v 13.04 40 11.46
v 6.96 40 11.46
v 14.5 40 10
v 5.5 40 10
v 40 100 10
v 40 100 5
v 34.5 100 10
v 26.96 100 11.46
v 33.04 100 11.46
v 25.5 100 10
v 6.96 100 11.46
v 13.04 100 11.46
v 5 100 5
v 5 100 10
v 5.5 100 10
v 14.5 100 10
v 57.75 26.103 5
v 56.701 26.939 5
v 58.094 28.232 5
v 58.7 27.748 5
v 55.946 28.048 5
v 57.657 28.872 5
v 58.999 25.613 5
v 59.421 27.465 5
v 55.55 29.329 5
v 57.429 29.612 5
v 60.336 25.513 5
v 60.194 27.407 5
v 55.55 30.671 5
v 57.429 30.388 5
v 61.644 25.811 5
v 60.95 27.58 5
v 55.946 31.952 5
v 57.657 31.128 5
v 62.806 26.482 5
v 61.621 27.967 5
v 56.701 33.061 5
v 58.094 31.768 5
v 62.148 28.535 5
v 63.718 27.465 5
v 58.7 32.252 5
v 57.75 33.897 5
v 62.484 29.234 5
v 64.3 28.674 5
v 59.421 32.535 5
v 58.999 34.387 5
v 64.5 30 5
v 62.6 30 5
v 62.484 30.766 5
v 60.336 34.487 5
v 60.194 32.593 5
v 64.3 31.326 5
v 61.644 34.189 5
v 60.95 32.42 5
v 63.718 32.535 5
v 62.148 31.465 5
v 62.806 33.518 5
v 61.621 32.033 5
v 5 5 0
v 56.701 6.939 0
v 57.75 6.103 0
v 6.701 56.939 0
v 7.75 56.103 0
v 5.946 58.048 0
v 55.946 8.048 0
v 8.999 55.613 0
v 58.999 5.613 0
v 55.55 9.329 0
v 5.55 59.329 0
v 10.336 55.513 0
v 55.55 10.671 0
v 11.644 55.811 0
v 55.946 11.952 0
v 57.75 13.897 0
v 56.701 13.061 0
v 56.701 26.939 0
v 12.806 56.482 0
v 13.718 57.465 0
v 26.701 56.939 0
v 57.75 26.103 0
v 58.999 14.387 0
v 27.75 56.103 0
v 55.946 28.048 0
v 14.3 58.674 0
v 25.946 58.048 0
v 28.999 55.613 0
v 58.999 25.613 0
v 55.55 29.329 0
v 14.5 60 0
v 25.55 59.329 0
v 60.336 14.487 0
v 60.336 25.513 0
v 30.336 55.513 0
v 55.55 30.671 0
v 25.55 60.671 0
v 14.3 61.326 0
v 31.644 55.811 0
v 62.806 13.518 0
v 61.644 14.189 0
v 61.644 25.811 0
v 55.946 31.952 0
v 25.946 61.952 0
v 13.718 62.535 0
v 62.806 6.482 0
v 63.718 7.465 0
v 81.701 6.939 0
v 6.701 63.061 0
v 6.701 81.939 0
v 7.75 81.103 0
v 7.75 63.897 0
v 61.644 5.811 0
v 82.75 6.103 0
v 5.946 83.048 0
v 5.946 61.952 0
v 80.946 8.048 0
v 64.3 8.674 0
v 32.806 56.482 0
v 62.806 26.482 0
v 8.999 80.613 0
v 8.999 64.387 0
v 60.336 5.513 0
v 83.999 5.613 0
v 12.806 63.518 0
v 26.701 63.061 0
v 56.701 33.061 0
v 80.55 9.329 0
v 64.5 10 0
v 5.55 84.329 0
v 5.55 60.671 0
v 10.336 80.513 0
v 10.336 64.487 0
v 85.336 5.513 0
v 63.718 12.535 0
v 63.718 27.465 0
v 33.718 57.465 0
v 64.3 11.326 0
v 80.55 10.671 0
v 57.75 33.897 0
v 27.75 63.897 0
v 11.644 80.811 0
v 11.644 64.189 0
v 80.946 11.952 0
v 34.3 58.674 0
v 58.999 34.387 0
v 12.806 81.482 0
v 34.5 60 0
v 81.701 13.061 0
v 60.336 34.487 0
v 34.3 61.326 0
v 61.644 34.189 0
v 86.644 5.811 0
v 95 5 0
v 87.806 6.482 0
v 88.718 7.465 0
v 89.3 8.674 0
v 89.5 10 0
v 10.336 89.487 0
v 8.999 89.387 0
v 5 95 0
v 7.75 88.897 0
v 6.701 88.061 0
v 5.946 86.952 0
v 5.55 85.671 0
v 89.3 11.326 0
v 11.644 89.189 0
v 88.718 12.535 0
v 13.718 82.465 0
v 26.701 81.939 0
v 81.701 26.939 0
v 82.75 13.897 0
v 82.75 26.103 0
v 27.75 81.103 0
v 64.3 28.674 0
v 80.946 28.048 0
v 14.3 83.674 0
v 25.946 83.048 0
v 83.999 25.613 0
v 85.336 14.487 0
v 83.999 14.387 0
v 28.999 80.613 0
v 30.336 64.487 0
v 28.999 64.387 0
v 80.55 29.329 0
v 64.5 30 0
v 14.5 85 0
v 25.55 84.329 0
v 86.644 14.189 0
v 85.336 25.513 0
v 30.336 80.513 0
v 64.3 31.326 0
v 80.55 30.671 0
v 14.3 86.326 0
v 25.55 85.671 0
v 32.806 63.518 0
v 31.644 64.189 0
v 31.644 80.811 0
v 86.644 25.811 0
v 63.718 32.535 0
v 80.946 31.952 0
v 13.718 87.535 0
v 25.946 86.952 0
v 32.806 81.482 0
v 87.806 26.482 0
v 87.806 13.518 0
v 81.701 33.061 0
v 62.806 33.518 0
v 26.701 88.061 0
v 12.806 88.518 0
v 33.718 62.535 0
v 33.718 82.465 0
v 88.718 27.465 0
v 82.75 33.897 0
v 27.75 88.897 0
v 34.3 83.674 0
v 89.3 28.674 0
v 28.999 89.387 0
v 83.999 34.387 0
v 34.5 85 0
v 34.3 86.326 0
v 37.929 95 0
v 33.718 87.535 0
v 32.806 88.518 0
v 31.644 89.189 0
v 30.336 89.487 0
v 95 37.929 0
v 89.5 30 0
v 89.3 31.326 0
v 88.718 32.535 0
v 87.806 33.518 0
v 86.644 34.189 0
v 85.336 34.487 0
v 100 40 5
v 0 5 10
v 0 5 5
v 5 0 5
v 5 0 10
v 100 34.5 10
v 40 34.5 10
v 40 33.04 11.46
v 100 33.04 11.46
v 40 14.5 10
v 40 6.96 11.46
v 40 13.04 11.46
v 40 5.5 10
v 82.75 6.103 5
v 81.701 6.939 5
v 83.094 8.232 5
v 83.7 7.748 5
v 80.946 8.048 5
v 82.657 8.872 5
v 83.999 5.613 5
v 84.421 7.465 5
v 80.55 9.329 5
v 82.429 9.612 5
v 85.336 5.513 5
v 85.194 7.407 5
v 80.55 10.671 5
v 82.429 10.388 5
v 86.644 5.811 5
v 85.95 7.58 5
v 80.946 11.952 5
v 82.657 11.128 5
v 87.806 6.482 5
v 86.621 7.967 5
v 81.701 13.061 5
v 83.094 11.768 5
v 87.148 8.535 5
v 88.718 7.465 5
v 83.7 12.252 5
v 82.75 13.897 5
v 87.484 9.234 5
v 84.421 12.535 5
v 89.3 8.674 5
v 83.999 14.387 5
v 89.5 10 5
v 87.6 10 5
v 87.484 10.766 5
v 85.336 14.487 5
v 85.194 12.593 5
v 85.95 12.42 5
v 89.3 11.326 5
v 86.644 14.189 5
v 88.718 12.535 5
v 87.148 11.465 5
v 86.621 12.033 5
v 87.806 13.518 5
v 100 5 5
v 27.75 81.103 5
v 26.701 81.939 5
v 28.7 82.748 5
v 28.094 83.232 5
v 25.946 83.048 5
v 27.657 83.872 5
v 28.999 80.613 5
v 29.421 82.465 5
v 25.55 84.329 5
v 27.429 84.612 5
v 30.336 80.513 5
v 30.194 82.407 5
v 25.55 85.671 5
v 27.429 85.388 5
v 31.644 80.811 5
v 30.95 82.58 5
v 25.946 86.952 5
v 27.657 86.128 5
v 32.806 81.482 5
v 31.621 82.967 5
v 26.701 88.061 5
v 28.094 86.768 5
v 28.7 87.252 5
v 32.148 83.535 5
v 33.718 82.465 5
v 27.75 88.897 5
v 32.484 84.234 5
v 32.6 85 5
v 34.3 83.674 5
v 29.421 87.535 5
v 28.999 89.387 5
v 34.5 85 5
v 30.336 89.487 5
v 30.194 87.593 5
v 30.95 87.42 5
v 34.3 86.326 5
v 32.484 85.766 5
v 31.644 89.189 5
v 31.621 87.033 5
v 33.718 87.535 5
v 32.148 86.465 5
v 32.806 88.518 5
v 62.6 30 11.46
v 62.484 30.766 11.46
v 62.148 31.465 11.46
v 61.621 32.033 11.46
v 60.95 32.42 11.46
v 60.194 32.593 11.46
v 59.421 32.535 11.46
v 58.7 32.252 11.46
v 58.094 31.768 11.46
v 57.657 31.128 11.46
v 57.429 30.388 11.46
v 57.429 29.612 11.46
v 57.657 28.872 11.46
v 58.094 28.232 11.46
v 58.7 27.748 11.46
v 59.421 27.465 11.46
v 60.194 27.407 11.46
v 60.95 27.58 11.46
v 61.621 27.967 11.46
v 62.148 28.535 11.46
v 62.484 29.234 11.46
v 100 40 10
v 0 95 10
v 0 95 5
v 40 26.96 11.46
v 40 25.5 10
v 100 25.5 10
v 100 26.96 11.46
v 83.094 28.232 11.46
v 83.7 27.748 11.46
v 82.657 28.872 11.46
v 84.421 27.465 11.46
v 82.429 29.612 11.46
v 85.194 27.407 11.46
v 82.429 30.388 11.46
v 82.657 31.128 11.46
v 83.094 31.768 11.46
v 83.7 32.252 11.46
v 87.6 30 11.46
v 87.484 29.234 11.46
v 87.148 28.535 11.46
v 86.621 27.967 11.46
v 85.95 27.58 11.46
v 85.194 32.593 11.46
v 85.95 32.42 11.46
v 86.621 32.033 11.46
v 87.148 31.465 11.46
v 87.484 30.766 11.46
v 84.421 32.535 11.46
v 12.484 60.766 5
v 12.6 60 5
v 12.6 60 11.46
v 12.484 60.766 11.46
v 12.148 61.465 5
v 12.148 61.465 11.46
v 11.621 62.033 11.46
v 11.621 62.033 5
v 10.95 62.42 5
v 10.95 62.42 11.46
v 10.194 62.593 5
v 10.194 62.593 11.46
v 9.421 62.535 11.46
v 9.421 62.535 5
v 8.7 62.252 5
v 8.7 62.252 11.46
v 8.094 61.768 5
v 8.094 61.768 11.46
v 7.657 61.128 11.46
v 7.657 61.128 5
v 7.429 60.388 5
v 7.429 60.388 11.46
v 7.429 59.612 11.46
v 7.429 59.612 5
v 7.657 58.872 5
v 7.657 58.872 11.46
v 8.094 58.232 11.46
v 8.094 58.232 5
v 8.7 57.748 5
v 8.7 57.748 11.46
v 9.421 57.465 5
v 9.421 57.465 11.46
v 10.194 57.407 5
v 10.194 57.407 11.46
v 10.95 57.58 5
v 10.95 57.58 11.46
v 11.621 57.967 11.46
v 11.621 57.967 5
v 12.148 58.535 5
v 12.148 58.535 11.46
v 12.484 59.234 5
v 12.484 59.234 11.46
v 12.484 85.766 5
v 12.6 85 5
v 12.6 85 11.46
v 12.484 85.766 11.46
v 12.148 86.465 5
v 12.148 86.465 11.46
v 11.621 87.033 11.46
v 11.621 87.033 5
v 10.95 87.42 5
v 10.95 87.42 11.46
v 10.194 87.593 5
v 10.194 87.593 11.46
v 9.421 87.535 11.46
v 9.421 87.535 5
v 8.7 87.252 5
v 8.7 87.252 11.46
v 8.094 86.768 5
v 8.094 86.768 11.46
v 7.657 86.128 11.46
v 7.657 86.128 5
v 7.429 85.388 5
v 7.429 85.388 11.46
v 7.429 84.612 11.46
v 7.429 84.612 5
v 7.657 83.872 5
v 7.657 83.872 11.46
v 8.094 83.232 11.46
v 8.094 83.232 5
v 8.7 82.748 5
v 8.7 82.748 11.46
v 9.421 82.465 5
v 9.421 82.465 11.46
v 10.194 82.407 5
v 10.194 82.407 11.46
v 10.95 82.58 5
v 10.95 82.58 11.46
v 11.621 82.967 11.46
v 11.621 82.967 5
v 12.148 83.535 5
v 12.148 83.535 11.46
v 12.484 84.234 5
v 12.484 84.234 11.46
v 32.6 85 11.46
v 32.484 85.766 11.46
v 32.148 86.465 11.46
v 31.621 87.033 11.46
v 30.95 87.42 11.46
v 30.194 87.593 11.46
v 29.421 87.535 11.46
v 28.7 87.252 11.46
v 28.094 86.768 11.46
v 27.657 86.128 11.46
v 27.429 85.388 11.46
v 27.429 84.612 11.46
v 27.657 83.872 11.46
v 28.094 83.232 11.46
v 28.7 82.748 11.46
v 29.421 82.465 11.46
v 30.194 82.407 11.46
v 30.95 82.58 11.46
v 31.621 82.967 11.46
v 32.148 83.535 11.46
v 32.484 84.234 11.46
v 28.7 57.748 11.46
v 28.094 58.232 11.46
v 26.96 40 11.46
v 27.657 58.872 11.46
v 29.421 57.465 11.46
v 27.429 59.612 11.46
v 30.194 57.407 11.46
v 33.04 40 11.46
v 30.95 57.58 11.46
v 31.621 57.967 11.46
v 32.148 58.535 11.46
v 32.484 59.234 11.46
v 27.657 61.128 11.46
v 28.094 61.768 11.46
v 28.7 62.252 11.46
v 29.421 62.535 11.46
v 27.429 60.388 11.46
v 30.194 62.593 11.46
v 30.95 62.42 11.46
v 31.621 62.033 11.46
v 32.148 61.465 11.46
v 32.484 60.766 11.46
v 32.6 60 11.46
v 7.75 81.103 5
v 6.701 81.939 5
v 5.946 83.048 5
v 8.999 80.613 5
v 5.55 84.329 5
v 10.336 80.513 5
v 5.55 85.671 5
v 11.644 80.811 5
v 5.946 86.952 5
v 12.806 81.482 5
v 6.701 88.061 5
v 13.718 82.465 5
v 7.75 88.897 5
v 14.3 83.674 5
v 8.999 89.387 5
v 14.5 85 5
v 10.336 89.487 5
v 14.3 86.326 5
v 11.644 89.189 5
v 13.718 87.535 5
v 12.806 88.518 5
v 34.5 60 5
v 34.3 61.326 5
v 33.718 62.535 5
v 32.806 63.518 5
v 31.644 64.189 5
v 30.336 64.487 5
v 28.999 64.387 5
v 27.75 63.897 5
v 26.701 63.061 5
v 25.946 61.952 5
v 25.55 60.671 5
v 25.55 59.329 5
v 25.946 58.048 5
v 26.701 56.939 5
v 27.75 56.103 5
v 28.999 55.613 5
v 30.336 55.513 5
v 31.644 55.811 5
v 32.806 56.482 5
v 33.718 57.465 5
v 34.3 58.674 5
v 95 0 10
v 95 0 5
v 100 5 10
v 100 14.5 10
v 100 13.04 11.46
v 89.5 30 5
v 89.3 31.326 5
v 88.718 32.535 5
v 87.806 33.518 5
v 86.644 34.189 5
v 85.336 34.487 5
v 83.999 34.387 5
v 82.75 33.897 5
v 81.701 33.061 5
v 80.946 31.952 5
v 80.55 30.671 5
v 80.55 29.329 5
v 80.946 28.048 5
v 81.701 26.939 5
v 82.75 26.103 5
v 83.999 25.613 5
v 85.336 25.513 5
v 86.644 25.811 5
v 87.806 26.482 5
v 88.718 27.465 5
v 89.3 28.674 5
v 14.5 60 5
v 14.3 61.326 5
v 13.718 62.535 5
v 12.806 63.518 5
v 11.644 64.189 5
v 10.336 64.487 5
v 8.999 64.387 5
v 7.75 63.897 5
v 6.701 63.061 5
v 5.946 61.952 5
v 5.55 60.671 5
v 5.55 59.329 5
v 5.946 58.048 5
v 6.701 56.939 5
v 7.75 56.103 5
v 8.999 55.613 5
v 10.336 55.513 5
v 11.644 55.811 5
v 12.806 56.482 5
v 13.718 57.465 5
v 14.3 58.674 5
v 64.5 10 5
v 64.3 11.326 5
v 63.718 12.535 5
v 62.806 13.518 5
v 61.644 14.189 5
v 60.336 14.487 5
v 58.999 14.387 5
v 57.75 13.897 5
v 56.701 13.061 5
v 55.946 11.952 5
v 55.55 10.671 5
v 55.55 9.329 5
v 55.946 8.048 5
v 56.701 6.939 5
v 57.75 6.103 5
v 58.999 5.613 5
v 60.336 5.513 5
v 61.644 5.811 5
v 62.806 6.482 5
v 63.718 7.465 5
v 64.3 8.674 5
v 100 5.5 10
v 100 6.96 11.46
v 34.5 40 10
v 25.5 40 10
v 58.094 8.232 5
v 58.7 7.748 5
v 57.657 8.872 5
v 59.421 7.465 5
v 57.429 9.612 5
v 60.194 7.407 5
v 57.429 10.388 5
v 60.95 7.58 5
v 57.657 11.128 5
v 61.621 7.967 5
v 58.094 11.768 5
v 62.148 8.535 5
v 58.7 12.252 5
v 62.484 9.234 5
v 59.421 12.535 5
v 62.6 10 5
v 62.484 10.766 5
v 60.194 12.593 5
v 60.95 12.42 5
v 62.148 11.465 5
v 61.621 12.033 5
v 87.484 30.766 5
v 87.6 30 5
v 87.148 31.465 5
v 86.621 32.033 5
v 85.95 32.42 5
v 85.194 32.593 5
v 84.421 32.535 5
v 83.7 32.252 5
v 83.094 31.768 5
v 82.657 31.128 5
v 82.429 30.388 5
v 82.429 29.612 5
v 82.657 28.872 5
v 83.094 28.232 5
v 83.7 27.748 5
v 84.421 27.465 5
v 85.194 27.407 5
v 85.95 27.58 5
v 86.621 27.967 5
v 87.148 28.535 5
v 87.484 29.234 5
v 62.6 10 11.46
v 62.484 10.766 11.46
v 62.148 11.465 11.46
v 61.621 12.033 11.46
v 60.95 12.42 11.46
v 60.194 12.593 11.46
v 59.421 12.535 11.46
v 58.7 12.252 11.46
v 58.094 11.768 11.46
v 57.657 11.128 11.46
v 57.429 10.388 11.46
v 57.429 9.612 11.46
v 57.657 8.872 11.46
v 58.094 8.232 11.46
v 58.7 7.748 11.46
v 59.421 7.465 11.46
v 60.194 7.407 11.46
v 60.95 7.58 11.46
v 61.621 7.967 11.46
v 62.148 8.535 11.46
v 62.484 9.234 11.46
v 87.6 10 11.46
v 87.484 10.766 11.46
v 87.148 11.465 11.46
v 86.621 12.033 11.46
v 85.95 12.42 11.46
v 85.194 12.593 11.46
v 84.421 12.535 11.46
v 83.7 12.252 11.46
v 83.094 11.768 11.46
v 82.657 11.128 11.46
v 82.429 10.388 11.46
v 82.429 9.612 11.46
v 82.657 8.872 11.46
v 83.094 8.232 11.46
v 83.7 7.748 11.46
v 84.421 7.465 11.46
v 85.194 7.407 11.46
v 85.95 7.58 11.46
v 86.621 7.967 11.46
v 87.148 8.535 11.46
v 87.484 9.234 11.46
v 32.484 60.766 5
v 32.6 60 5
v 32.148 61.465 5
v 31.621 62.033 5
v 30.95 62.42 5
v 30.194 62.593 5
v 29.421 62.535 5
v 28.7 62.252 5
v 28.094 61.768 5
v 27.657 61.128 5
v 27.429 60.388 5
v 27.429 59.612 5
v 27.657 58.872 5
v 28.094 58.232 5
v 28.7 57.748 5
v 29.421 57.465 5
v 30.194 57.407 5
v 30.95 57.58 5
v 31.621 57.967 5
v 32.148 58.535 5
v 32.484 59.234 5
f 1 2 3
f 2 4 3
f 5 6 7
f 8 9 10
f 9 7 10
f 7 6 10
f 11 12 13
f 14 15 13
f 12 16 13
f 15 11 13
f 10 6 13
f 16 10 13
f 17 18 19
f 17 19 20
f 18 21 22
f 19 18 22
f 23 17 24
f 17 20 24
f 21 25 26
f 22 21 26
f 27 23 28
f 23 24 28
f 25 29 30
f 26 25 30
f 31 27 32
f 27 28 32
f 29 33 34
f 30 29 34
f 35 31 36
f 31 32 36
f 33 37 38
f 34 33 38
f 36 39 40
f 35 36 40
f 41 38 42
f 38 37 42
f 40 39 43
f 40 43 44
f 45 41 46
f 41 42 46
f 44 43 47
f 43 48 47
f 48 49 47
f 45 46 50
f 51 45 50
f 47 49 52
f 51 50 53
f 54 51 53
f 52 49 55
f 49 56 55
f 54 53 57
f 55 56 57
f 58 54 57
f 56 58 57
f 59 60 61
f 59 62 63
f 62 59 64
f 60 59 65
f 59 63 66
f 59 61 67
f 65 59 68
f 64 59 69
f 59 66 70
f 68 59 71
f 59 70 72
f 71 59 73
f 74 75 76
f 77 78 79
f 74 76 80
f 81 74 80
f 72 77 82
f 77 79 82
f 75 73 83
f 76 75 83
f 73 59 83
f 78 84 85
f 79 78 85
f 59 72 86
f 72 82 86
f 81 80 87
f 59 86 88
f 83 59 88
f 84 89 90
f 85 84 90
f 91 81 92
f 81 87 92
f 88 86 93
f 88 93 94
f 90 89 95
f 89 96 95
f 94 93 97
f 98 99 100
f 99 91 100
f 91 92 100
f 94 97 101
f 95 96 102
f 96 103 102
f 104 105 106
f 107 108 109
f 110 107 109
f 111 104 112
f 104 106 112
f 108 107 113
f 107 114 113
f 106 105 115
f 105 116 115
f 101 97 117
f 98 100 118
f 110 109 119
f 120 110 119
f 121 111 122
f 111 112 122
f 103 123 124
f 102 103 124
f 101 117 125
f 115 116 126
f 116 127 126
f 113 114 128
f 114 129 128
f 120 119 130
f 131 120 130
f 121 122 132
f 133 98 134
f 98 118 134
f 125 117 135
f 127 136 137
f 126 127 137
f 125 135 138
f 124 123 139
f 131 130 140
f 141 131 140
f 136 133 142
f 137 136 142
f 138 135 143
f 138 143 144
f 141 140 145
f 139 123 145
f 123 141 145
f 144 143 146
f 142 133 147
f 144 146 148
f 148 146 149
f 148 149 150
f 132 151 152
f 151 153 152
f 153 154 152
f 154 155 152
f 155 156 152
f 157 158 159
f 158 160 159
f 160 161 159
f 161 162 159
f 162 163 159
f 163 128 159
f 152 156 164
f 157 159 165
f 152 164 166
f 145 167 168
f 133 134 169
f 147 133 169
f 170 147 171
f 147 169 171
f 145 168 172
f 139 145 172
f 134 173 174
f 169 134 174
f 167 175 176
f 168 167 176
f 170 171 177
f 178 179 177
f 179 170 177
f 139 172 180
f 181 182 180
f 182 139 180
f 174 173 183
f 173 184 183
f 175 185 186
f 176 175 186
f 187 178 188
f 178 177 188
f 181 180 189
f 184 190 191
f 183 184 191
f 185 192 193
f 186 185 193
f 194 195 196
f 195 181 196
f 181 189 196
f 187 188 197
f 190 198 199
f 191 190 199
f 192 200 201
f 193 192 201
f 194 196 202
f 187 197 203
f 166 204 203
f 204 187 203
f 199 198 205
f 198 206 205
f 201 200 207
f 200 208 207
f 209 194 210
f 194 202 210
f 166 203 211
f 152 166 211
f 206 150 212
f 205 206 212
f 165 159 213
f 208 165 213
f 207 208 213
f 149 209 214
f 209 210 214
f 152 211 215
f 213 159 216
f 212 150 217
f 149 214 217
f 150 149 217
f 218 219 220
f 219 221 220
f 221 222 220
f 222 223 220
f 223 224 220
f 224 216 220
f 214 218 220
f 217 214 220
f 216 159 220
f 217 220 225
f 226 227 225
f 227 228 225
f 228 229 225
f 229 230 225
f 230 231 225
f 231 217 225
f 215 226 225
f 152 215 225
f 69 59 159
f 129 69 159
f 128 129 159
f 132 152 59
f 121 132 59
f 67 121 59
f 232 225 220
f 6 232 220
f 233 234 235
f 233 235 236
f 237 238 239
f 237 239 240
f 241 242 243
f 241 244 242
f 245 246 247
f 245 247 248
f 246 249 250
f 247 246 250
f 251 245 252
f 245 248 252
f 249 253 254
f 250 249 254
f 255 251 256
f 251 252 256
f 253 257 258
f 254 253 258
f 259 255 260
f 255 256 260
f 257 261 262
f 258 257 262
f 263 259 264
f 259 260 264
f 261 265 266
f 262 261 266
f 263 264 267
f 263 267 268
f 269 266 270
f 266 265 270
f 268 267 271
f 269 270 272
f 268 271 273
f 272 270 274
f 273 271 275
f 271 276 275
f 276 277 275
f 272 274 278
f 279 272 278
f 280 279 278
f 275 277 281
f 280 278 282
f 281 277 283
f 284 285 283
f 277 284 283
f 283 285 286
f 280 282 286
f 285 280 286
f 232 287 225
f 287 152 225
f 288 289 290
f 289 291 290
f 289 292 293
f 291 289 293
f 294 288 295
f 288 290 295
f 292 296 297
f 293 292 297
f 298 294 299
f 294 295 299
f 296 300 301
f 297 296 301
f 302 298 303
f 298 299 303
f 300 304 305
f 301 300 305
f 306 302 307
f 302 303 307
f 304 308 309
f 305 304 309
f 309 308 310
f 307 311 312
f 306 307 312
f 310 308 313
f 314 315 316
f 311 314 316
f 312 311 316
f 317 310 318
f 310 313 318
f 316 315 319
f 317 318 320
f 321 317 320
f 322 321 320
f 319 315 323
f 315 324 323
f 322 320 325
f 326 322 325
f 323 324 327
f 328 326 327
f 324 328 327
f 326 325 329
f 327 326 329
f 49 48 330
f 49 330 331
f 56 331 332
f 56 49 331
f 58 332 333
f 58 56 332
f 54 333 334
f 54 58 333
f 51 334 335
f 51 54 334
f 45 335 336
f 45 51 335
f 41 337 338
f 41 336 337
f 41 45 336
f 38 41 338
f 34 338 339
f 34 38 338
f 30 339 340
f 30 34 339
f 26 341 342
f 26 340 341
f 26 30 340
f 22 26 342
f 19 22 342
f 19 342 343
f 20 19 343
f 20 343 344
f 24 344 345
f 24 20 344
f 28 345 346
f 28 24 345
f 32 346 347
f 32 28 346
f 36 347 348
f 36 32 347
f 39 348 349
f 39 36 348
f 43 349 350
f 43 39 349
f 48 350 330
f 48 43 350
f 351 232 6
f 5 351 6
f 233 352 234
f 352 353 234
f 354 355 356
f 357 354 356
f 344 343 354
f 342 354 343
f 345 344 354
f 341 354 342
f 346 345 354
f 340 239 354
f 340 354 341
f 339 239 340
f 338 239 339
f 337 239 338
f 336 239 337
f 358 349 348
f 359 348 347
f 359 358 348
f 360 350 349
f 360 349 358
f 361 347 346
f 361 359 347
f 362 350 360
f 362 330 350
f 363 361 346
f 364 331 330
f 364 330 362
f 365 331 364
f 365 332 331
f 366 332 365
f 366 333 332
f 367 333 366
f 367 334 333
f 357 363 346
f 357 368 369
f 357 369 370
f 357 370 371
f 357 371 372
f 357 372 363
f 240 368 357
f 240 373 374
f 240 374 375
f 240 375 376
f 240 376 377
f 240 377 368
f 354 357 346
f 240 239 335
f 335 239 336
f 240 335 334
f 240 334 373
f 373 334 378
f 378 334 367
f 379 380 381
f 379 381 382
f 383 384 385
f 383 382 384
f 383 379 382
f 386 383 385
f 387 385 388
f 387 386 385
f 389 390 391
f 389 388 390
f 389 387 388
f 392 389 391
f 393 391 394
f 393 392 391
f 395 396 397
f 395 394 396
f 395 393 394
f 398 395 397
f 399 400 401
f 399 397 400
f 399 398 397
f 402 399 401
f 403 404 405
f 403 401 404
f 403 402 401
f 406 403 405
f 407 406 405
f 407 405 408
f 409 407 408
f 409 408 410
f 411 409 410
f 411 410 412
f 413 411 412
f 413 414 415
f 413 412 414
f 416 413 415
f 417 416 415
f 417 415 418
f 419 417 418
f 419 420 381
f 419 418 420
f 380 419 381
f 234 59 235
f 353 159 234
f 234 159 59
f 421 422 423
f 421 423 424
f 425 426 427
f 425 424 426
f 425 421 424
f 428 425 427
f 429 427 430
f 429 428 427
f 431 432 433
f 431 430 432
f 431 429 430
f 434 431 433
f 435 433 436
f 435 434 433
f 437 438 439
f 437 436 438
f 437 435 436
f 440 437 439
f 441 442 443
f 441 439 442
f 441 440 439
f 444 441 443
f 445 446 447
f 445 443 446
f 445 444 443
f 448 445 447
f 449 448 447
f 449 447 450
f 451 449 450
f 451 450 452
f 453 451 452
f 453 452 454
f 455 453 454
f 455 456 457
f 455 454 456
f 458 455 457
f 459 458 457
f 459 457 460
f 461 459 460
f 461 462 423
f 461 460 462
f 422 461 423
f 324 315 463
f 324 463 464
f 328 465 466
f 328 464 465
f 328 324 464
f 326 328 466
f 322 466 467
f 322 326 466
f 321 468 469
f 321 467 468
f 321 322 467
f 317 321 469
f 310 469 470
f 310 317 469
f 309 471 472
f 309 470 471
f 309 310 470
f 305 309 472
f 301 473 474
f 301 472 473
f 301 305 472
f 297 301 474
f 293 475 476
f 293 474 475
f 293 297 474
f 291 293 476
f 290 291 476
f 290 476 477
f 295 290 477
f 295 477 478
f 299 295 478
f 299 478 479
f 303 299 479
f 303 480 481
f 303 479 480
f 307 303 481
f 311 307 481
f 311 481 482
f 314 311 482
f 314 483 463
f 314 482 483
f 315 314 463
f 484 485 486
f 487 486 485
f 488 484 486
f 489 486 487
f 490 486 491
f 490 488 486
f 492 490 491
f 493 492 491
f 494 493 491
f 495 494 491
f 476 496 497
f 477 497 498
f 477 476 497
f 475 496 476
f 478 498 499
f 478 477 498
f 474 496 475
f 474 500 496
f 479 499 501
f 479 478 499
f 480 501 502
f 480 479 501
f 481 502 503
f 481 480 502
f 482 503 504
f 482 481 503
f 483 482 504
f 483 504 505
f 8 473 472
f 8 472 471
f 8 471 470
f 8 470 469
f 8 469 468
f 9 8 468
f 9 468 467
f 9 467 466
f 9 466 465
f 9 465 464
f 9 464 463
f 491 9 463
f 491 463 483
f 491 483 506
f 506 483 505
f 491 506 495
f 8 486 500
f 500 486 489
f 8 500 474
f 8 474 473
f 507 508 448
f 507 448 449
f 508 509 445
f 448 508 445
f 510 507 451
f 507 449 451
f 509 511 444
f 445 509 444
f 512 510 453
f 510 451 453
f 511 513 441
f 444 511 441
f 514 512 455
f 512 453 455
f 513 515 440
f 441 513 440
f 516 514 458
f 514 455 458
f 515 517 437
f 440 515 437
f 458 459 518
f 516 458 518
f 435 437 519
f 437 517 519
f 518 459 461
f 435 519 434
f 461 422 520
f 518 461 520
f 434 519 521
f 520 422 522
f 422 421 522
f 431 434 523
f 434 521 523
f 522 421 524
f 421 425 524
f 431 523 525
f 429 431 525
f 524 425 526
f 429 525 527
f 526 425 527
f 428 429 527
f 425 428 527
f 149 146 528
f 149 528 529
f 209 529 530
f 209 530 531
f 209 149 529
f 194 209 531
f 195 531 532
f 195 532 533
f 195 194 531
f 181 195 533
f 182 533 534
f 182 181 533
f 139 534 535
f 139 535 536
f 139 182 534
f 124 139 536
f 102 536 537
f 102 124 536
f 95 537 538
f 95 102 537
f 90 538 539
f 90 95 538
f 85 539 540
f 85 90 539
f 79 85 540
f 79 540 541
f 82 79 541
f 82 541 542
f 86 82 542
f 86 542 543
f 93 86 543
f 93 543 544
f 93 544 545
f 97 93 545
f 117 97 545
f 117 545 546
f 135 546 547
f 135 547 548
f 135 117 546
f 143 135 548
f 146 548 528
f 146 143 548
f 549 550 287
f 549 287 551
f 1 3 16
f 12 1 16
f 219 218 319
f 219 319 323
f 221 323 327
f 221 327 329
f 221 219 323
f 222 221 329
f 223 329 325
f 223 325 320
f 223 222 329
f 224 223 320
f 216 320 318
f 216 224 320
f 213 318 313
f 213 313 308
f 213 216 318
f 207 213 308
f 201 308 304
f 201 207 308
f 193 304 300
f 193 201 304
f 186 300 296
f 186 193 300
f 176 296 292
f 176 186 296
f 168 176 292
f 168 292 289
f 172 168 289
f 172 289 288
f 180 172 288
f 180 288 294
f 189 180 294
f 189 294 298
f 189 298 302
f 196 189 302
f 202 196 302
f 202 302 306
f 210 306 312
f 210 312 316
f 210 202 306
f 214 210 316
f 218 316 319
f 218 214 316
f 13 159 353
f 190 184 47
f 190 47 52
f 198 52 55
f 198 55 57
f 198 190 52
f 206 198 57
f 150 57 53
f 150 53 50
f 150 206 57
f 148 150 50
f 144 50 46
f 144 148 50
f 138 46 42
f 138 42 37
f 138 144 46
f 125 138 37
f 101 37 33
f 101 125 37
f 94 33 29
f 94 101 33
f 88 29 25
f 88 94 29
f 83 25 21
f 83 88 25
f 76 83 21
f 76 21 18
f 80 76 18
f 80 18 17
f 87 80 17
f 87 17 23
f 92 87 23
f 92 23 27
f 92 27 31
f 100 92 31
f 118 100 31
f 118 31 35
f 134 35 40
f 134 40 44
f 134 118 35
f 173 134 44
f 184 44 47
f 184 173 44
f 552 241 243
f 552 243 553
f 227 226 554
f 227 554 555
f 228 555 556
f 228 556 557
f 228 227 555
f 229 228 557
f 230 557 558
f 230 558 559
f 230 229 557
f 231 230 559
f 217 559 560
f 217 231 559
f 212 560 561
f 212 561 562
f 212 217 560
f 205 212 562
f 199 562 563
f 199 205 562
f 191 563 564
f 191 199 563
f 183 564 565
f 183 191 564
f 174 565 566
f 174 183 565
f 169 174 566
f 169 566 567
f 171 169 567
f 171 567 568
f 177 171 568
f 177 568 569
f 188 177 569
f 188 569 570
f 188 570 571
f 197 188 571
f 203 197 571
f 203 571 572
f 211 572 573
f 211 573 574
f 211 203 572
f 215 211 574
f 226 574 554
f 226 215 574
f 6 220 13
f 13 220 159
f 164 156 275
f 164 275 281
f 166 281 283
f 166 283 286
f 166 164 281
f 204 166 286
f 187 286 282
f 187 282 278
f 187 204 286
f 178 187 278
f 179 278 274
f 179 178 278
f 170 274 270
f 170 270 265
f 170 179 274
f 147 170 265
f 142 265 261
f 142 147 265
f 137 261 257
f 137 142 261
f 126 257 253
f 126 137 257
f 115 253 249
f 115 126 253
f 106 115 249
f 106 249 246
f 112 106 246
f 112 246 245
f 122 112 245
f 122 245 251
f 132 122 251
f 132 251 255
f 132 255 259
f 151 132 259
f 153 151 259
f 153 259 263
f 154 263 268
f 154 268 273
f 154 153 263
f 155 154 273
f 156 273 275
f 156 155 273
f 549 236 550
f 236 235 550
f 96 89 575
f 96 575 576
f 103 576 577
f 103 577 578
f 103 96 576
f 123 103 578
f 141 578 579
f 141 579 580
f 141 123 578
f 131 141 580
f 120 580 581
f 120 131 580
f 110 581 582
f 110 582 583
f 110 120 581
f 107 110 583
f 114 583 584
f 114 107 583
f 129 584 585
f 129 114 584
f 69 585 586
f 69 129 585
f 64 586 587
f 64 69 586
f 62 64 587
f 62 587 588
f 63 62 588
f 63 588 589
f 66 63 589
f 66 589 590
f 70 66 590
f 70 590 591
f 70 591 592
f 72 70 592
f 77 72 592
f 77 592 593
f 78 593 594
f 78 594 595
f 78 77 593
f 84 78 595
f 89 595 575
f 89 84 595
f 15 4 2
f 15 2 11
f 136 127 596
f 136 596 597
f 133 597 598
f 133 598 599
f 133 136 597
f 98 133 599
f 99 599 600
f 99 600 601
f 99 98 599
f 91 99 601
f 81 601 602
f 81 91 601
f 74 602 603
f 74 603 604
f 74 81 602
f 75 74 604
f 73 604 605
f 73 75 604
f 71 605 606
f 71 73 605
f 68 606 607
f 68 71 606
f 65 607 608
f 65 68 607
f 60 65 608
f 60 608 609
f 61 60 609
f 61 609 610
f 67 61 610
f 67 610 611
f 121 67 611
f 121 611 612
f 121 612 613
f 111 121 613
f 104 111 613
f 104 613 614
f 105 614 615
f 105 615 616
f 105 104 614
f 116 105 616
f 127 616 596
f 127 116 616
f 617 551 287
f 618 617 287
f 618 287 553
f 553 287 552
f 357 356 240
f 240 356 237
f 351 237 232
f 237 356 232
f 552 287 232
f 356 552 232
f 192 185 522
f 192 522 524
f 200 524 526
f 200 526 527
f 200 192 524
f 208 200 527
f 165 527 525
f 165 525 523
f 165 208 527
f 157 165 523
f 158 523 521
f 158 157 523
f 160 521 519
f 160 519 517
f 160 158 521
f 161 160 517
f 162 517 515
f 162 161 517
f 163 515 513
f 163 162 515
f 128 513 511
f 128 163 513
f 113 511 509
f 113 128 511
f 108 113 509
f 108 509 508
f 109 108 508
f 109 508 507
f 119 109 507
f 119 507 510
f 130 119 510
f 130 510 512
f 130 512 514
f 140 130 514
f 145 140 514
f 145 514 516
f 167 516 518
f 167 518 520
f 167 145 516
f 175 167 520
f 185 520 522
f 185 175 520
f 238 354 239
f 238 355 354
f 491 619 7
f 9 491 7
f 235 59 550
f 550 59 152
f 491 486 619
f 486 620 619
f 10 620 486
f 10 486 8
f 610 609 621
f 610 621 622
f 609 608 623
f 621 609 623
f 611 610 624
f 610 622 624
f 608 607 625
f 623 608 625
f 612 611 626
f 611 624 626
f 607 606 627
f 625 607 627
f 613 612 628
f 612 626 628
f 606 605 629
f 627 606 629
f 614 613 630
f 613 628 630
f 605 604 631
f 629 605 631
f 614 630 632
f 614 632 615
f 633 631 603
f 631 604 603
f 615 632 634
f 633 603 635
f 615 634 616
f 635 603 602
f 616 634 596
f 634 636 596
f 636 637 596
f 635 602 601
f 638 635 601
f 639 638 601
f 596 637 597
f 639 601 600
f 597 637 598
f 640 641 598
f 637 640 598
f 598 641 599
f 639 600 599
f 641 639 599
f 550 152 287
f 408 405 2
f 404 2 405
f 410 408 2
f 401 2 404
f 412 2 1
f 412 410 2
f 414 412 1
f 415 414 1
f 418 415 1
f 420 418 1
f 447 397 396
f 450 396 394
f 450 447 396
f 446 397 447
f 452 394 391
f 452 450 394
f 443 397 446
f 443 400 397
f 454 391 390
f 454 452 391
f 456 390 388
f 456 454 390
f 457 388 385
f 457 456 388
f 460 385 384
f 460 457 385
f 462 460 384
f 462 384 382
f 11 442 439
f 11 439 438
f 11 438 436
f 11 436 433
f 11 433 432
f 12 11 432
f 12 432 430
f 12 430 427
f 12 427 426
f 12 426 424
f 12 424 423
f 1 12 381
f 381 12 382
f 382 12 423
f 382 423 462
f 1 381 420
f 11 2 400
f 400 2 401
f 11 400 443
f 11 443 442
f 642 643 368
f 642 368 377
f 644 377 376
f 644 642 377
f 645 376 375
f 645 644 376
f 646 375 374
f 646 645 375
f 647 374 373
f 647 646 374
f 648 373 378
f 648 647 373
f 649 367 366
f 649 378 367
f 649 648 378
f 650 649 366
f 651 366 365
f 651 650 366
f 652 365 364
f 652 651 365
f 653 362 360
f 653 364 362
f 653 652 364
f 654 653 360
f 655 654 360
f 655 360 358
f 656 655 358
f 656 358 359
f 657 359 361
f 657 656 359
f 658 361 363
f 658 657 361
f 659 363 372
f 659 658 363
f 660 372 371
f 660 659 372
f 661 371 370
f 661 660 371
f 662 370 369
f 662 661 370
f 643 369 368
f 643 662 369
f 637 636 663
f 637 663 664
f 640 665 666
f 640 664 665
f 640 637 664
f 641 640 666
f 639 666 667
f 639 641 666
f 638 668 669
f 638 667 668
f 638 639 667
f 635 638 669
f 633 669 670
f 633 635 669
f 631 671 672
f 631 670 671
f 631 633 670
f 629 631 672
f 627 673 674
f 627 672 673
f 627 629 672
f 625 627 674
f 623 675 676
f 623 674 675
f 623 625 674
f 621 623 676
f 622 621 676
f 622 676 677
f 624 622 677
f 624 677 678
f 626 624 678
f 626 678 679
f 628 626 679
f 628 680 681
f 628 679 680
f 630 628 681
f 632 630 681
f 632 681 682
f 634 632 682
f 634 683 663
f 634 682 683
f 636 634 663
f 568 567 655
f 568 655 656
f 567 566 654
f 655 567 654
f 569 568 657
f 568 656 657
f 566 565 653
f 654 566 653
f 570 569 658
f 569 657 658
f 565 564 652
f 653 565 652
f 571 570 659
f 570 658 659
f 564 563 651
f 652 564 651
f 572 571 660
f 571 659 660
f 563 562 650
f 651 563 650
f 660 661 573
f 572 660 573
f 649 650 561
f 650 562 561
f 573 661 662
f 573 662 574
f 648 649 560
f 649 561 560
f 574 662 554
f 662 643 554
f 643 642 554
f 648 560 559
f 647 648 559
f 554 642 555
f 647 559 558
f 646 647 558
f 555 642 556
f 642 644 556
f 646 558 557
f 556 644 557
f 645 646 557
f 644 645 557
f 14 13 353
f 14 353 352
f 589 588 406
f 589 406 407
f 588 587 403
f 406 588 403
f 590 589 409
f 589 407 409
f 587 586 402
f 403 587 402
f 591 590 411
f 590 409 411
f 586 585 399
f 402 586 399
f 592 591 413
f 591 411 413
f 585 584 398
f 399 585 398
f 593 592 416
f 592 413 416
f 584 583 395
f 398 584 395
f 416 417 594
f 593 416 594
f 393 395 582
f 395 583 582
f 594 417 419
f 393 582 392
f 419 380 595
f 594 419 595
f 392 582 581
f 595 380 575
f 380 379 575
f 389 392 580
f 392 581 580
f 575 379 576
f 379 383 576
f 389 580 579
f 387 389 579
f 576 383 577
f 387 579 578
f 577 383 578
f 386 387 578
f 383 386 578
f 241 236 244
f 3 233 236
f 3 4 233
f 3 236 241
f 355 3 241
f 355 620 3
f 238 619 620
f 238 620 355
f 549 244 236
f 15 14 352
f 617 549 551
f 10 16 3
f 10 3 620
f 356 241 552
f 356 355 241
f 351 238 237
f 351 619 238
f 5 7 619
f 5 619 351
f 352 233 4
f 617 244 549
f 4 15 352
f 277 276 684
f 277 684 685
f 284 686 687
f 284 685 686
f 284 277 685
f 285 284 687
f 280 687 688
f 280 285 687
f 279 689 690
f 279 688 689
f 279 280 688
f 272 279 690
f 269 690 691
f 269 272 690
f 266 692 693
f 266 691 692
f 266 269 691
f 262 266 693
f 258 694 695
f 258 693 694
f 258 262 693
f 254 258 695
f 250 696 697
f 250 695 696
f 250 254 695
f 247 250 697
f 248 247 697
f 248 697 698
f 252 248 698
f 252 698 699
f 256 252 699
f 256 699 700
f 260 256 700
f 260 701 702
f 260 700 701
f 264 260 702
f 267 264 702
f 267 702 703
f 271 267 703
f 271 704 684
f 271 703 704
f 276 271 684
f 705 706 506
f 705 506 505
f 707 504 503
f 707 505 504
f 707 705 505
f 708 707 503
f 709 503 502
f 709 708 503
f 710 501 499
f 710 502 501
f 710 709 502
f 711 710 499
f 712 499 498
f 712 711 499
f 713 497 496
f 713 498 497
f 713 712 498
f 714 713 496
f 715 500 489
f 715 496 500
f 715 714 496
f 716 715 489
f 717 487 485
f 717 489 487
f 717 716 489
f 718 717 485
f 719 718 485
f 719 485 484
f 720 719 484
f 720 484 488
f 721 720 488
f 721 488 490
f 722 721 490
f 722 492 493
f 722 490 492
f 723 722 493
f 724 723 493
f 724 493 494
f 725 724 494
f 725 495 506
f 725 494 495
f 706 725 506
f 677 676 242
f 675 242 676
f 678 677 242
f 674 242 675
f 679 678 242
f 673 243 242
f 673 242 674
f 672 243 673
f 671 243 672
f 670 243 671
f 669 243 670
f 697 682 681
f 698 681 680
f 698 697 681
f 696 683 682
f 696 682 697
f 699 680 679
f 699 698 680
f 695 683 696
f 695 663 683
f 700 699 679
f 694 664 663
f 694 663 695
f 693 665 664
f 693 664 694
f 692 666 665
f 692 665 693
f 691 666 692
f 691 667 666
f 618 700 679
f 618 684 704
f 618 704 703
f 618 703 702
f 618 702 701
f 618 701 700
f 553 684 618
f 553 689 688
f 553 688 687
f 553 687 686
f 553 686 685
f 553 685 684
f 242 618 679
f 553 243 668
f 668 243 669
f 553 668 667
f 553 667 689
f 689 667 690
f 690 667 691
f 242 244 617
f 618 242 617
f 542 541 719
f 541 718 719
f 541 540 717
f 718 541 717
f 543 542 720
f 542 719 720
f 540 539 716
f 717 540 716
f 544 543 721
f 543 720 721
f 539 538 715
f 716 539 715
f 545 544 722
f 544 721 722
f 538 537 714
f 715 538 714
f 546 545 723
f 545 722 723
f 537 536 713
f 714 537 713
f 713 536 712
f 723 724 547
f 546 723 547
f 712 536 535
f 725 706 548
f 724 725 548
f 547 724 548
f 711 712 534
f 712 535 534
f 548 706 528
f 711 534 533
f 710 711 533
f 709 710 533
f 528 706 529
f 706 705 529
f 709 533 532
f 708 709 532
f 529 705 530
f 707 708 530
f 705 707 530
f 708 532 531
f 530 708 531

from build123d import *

# Parameters (mm, degrees)
BOSS_EXTRUDE1_DEPTH     = 10
SKETCH2_R               = 2.6
CUT_EXTRUDE1_DEPTH      = 142.774468788
BOSS_EXTRUDE3_START     = 10
SKETCH3_W               = 60
SKETCH3_H               = 9
SKETCH3_W_2             = 9
SKETCH3_H_2             = 60
BOSS_EXTRUDE3_DEPTH     = 1.46
CUT_EXTRUDE2_DEPTH      = 142.884923794
CUT_EXTRUDE2_DEPTH_BACK = 142.884923794
SKETCH2_2_R             = 2.6
CHAMFER1_SIZE           = 1.46
SKETCH4_R               = 4.5
CUT_EXTRUDE3_DEPTH      = 5
CHAMFER2_SIZE           = 5


with BuildPart() as part:
    # Sketch1 → Boss-Extrude1 (new body)
    with BuildSketch(Plane.XY):
        Polygon((0, 0), (100, 0), (100, 40), (40, 100), (0, 100), align=None)
    extrude(amount=BOSS_EXTRUDE1_DEPTH)

    # Sketch2 → Cut-Extrude1 (cut, through all)
    with BuildSketch(Plane.XY):
        with Locations((10, 85)):
            Circle(SKETCH2_R)
        with Locations((30, 85)):
            Circle(SKETCH2_R)
        with Locations((10, 60)):
            Circle(SKETCH2_R)
        with Locations((30, 60)):
            Circle(SKETCH2_R)
        with Locations((85, 30)):
            Circle(SKETCH2_R)
        with Locations((85, 10)):
            Circle(SKETCH2_R)
        with Locations((60, 10)):
            Circle(SKETCH2_R)
        with Locations((60, 30)):
            Circle(SKETCH2_R)
    extrude(amount=CUT_EXTRUDE1_DEPTH, mode=Mode.SUBTRACT)

    # Sketch3 → Boss-Extrude3 (add)
    with BuildSketch(Plane.XY.offset(BOSS_EXTRUDE3_START)):
        with Locations((70, 30)):
            Rectangle(SKETCH3_W, SKETCH3_H)
        with Locations((70, 10)):
            Rectangle(SKETCH3_W, SKETCH3_H)
        with Locations((10, 70)):
            Rectangle(SKETCH3_W_2, SKETCH3_H_2)
        with Locations((30, 70)):
            Rectangle(SKETCH3_W_2, SKETCH3_H_2)
    extrude(amount=BOSS_EXTRUDE3_DEPTH)

    # Sketch2<2> → Cut-Extrude2 (cut, two sides: drawn at the far end of the back side and taken through both)
    with BuildSketch(Plane.XY.offset(-CUT_EXTRUDE2_DEPTH_BACK)):
        with Locations((10, 85)):
            Circle(SKETCH2_2_R)
        with Locations((30, 85)):
            Circle(SKETCH2_2_R)
        with Locations((10, 60)):
            Circle(SKETCH2_2_R)
        with Locations((30, 60)):
            Circle(SKETCH2_2_R)
        with Locations((85, 30)):
            Circle(SKETCH2_2_R)
        with Locations((85, 10)):
            Circle(SKETCH2_2_R)
        with Locations((60, 10)):
            Circle(SKETCH2_2_R)
        with Locations((60, 30)):
            Circle(SKETCH2_2_R)
    extrude(amount=CUT_EXTRUDE2_DEPTH + CUT_EXTRUDE2_DEPTH_BACK, mode=Mode.SUBTRACT)

    # Chamfer1
    chamfer1_edges = [part.edges().sort_by_distance(p)[0] for p in [
        (14.5, 70, 11.46),
        (5.5, 70, 11.46),
        (25.5, 70, 11.46),
        (34.5, 70, 11.46),
        (70, 5.5, 11.46),
        (70, 14.5, 11.46),
        (70, 25.5, 11.46),
        (70, 34.5, 11.46),
    ]]
    chamfer(chamfer1_edges, length=CHAMFER1_SIZE - 0.0001)  # a hair under: the kernel refuses the full size

    # Sketch4 → Cut-Extrude3 (cut)
    with BuildSketch(Plane.XY):
        with Locations((10, 85)):
            Circle(SKETCH4_R)
        with Locations((30, 85)):
            Circle(SKETCH4_R)
        with Locations((30, 60)):
            Circle(SKETCH4_R)
        with Locations((10, 60)):
            Circle(SKETCH4_R)
        with Locations((60, 30)):
            Circle(SKETCH4_R)
        with Locations((85, 30)):
            Circle(SKETCH4_R)
        with Locations((85, 10)):
            Circle(SKETCH4_R)
        with Locations((60, 10)):
            Circle(SKETCH4_R)
    extrude(amount=CUT_EXTRUDE3_DEPTH, mode=Mode.SUBTRACT)

    # Chamfer2
    chamfer2_edges = [part.edges().sort_by_distance(p)[0] for p in [
        (20, 100, 0),
        (70, 70, 0),
        (100, 20, 0),
        (50, 0, 0),
        (0, 50, 0),
        (0, 100, 5),
        (100, 0, 5),
        (0, 0, 5),
    ]]
    chamfer(chamfer2_edges, length=CHAMFER2_SIZE)


solid = part.part
